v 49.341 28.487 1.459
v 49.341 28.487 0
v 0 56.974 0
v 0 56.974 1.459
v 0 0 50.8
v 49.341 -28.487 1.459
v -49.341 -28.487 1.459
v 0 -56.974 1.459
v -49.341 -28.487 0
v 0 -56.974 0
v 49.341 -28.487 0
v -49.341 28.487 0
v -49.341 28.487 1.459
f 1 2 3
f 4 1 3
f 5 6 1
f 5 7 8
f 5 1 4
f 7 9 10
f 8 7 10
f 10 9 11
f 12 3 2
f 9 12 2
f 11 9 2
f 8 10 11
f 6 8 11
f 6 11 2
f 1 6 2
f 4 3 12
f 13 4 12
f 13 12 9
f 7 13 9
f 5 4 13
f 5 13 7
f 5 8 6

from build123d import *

# Parameters (mm, degrees)
F1_DEPTH = 50.8
F2_SIZE  = 49.34077


with BuildPart() as f1:
    # F0 (on Top) → F1 (new body)
    with BuildSketch(Plane.XY):
        Polygon((49.3408840265, 0), (49.3408840265, 28.4869726747), (0, 56.9739453495), (-49.3408840265, 28.4869726747), (-49.3408840265, 0), align=None)
        Polygon((49.3408840265, -28.4869726747), (49.3408840265, 0), (-49.3408840265, 0), (-49.3408840265, -28.4869726747), (0, -56.9739453495), align=None)
    extrude(amount=F1_DEPTH)

    # F2
    f2_edges = [f1.edges().sort_by_distance(p)[0] for p in [
        (24.670442, -42.730459, 50.8),
        (49.340884, 0, 50.8),
        (24.670442, 42.730459, 50.8),
        (-24.670442, 42.730459, 50.8),
        (-49.340884, 0, 50.8),
        (-24.670442, -42.730459, 50.8),
    ]]
    chamfer(f2_edges, length=F2_SIZE)


solid = f1.part
